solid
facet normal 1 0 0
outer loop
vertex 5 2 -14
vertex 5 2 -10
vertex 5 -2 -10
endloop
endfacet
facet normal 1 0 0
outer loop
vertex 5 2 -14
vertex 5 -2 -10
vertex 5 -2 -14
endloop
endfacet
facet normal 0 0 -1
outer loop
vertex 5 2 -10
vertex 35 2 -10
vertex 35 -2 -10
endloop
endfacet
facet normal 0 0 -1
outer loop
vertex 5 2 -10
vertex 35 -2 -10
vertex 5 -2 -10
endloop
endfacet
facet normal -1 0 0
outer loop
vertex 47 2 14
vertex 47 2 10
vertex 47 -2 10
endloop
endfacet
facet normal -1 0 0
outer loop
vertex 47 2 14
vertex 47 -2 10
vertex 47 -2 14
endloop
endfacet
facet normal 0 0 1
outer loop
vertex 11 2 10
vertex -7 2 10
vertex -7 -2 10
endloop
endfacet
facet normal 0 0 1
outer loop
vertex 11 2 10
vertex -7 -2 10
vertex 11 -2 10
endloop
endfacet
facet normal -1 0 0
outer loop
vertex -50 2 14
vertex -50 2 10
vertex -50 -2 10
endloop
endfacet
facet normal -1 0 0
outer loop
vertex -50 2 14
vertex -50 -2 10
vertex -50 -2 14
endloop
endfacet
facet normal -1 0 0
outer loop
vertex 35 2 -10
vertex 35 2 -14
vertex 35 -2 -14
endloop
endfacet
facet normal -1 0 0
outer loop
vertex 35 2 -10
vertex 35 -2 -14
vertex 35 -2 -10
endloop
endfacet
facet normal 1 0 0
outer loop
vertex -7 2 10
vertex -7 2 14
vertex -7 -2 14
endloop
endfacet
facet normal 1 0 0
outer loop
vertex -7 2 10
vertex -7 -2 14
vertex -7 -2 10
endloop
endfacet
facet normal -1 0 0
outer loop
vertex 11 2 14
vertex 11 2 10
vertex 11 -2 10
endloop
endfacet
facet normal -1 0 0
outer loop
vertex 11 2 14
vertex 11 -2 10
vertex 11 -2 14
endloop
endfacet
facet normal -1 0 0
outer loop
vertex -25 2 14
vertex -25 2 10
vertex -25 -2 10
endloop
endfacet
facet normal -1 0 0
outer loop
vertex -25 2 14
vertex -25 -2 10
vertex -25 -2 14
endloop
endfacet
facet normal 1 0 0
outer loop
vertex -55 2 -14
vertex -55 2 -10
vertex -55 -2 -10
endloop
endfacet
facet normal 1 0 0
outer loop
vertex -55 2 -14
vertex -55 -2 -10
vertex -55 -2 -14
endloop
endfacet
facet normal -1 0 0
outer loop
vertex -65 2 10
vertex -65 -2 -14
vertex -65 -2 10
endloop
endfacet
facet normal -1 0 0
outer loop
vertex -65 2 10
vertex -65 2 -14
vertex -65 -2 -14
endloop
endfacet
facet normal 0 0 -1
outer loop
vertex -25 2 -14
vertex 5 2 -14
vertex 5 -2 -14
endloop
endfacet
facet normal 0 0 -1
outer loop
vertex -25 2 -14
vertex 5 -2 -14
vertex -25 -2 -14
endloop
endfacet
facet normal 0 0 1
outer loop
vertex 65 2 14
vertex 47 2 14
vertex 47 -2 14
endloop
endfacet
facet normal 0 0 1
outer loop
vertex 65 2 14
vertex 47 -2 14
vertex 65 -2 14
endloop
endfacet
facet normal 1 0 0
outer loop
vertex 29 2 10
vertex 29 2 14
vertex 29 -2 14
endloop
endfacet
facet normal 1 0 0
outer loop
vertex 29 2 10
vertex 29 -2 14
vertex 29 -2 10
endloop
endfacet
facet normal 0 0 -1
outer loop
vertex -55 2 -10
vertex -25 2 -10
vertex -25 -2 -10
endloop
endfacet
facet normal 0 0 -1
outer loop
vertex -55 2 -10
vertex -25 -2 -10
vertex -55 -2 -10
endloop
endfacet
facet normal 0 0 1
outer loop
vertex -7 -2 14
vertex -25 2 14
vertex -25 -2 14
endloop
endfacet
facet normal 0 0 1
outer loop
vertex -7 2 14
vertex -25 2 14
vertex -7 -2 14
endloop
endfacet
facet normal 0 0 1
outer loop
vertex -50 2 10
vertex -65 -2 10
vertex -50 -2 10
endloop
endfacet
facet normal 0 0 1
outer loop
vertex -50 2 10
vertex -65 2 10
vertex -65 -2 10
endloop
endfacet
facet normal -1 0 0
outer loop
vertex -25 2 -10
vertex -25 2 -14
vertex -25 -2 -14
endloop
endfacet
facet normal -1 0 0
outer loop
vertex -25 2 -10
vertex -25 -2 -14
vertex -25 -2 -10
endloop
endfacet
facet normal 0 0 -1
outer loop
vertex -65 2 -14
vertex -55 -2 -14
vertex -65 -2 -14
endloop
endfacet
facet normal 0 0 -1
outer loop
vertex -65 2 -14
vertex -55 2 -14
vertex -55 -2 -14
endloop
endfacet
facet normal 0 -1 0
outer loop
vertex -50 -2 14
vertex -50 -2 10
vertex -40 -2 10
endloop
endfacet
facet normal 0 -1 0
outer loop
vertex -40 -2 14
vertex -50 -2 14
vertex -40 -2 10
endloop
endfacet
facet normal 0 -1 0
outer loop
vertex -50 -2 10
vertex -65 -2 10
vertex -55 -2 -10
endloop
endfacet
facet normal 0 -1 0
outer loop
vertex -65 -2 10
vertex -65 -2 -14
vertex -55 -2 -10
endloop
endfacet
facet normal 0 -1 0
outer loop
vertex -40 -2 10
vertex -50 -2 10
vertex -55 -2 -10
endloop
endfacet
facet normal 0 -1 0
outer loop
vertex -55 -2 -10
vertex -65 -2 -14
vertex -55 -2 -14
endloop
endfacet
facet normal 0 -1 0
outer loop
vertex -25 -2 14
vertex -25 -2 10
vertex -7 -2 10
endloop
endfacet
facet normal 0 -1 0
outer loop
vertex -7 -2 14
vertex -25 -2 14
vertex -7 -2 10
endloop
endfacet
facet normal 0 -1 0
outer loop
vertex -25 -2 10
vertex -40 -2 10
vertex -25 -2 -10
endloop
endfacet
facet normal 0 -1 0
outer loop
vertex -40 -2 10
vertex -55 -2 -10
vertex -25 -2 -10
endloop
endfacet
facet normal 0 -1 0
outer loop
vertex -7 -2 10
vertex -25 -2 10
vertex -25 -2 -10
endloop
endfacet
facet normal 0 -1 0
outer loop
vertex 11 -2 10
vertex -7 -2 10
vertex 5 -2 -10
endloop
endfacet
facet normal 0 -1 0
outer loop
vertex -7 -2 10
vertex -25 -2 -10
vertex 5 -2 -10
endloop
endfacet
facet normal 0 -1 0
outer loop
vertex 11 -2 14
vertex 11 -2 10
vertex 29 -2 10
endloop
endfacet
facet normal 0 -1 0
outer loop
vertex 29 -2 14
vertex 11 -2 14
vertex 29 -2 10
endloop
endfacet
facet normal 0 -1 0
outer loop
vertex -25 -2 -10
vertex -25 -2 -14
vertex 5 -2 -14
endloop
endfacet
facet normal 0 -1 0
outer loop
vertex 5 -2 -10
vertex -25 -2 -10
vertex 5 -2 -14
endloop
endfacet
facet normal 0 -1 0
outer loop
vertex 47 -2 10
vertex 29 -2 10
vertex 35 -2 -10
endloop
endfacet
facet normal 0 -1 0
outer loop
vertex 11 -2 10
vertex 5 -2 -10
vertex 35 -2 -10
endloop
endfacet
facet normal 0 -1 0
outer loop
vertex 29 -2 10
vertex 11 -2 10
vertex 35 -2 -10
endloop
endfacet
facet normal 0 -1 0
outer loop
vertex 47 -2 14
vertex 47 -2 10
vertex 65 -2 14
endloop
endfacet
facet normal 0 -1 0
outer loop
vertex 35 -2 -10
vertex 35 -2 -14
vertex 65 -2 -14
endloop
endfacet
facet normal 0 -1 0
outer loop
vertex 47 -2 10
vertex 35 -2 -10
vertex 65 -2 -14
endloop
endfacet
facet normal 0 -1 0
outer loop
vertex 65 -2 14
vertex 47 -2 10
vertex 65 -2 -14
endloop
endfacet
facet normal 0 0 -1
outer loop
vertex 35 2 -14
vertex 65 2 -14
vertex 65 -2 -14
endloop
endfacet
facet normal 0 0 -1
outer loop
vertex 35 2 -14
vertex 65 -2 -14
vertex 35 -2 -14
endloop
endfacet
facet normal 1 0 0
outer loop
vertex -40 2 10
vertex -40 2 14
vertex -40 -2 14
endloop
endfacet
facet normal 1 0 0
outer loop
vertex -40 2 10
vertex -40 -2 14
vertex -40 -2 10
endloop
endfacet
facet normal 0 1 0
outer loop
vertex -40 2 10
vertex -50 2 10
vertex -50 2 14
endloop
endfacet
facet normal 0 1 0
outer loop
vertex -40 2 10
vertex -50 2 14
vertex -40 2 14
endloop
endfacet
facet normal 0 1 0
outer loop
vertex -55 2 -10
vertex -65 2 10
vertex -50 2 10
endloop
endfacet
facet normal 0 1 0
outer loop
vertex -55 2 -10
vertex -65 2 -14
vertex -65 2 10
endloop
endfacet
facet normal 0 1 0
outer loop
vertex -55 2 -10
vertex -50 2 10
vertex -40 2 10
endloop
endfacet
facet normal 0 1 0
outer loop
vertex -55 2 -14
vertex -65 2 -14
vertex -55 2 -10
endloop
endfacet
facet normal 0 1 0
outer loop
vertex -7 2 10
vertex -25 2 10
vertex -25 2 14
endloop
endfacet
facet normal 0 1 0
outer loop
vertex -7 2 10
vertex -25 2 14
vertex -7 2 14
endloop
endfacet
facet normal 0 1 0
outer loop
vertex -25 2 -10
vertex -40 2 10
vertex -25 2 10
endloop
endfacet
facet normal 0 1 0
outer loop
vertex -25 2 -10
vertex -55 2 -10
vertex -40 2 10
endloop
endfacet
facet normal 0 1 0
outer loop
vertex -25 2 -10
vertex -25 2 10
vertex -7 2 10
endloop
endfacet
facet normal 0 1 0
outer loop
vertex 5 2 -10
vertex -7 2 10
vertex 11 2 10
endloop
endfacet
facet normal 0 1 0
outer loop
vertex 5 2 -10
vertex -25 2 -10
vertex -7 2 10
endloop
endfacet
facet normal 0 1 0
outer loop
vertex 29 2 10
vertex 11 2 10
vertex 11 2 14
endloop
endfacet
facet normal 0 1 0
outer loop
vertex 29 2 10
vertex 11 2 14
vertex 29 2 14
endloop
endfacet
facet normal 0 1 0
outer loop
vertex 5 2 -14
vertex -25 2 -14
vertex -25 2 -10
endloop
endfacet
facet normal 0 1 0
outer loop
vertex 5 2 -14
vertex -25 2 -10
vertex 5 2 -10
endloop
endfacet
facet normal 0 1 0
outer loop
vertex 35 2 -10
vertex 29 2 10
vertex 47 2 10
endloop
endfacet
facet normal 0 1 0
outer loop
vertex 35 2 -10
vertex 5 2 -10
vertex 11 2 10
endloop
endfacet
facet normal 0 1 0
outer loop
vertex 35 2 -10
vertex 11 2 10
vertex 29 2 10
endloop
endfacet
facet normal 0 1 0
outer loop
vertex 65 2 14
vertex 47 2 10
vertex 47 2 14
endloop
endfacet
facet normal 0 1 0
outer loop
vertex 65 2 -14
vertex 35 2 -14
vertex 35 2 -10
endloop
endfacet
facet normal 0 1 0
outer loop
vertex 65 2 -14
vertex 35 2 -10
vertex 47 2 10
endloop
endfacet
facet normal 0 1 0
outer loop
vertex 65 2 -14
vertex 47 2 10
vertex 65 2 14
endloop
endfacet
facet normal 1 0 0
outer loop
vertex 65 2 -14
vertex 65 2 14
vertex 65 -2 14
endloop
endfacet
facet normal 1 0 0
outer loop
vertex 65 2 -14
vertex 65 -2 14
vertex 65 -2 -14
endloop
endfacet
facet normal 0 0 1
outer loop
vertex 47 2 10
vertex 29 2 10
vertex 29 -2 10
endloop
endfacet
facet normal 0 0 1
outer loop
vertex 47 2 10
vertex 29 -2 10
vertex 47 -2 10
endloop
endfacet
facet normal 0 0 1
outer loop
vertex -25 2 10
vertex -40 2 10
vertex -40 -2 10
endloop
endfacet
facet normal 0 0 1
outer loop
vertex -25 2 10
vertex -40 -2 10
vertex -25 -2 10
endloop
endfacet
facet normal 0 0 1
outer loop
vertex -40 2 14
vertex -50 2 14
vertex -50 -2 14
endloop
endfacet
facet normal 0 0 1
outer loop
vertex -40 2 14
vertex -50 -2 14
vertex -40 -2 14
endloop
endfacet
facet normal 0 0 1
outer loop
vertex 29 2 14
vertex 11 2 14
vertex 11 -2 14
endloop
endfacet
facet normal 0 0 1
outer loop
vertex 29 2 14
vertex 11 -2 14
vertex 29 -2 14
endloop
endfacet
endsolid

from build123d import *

# Parameters (mm, degrees)
BOSS_EXTRUDE1_DEPTH = 2


with BuildPart() as part:
    # Sketch1 → Boss-Extrude1 (new, symmetric)
    with BuildSketch(Plane(origin=(0, 0, 0), x_dir=(1, 0, 0), z_dir=(0, 1, 0))):
        Polygon((-65, -10), (-50, -10), (-50, -14), (-40, -14), (-40, -10), (-25, -10), (-25, -14), (-7, -14), (-7, -10), (11, -10), (11, -14), (29, -14), (29, -10), (47, -10), (47, -14), (65, -14), (65, -10), (65, 10), (65, 14), (35, 14), (35, 10), (5, 10), (5, 14), (-25, 14), (-25, 10), (-55, 10), (-55, 14), (-65, 14), (-65, 10), align=None)
    extrude(amount=BOSS_EXTRUDE1_DEPTH, both=True)


solid = part.part
